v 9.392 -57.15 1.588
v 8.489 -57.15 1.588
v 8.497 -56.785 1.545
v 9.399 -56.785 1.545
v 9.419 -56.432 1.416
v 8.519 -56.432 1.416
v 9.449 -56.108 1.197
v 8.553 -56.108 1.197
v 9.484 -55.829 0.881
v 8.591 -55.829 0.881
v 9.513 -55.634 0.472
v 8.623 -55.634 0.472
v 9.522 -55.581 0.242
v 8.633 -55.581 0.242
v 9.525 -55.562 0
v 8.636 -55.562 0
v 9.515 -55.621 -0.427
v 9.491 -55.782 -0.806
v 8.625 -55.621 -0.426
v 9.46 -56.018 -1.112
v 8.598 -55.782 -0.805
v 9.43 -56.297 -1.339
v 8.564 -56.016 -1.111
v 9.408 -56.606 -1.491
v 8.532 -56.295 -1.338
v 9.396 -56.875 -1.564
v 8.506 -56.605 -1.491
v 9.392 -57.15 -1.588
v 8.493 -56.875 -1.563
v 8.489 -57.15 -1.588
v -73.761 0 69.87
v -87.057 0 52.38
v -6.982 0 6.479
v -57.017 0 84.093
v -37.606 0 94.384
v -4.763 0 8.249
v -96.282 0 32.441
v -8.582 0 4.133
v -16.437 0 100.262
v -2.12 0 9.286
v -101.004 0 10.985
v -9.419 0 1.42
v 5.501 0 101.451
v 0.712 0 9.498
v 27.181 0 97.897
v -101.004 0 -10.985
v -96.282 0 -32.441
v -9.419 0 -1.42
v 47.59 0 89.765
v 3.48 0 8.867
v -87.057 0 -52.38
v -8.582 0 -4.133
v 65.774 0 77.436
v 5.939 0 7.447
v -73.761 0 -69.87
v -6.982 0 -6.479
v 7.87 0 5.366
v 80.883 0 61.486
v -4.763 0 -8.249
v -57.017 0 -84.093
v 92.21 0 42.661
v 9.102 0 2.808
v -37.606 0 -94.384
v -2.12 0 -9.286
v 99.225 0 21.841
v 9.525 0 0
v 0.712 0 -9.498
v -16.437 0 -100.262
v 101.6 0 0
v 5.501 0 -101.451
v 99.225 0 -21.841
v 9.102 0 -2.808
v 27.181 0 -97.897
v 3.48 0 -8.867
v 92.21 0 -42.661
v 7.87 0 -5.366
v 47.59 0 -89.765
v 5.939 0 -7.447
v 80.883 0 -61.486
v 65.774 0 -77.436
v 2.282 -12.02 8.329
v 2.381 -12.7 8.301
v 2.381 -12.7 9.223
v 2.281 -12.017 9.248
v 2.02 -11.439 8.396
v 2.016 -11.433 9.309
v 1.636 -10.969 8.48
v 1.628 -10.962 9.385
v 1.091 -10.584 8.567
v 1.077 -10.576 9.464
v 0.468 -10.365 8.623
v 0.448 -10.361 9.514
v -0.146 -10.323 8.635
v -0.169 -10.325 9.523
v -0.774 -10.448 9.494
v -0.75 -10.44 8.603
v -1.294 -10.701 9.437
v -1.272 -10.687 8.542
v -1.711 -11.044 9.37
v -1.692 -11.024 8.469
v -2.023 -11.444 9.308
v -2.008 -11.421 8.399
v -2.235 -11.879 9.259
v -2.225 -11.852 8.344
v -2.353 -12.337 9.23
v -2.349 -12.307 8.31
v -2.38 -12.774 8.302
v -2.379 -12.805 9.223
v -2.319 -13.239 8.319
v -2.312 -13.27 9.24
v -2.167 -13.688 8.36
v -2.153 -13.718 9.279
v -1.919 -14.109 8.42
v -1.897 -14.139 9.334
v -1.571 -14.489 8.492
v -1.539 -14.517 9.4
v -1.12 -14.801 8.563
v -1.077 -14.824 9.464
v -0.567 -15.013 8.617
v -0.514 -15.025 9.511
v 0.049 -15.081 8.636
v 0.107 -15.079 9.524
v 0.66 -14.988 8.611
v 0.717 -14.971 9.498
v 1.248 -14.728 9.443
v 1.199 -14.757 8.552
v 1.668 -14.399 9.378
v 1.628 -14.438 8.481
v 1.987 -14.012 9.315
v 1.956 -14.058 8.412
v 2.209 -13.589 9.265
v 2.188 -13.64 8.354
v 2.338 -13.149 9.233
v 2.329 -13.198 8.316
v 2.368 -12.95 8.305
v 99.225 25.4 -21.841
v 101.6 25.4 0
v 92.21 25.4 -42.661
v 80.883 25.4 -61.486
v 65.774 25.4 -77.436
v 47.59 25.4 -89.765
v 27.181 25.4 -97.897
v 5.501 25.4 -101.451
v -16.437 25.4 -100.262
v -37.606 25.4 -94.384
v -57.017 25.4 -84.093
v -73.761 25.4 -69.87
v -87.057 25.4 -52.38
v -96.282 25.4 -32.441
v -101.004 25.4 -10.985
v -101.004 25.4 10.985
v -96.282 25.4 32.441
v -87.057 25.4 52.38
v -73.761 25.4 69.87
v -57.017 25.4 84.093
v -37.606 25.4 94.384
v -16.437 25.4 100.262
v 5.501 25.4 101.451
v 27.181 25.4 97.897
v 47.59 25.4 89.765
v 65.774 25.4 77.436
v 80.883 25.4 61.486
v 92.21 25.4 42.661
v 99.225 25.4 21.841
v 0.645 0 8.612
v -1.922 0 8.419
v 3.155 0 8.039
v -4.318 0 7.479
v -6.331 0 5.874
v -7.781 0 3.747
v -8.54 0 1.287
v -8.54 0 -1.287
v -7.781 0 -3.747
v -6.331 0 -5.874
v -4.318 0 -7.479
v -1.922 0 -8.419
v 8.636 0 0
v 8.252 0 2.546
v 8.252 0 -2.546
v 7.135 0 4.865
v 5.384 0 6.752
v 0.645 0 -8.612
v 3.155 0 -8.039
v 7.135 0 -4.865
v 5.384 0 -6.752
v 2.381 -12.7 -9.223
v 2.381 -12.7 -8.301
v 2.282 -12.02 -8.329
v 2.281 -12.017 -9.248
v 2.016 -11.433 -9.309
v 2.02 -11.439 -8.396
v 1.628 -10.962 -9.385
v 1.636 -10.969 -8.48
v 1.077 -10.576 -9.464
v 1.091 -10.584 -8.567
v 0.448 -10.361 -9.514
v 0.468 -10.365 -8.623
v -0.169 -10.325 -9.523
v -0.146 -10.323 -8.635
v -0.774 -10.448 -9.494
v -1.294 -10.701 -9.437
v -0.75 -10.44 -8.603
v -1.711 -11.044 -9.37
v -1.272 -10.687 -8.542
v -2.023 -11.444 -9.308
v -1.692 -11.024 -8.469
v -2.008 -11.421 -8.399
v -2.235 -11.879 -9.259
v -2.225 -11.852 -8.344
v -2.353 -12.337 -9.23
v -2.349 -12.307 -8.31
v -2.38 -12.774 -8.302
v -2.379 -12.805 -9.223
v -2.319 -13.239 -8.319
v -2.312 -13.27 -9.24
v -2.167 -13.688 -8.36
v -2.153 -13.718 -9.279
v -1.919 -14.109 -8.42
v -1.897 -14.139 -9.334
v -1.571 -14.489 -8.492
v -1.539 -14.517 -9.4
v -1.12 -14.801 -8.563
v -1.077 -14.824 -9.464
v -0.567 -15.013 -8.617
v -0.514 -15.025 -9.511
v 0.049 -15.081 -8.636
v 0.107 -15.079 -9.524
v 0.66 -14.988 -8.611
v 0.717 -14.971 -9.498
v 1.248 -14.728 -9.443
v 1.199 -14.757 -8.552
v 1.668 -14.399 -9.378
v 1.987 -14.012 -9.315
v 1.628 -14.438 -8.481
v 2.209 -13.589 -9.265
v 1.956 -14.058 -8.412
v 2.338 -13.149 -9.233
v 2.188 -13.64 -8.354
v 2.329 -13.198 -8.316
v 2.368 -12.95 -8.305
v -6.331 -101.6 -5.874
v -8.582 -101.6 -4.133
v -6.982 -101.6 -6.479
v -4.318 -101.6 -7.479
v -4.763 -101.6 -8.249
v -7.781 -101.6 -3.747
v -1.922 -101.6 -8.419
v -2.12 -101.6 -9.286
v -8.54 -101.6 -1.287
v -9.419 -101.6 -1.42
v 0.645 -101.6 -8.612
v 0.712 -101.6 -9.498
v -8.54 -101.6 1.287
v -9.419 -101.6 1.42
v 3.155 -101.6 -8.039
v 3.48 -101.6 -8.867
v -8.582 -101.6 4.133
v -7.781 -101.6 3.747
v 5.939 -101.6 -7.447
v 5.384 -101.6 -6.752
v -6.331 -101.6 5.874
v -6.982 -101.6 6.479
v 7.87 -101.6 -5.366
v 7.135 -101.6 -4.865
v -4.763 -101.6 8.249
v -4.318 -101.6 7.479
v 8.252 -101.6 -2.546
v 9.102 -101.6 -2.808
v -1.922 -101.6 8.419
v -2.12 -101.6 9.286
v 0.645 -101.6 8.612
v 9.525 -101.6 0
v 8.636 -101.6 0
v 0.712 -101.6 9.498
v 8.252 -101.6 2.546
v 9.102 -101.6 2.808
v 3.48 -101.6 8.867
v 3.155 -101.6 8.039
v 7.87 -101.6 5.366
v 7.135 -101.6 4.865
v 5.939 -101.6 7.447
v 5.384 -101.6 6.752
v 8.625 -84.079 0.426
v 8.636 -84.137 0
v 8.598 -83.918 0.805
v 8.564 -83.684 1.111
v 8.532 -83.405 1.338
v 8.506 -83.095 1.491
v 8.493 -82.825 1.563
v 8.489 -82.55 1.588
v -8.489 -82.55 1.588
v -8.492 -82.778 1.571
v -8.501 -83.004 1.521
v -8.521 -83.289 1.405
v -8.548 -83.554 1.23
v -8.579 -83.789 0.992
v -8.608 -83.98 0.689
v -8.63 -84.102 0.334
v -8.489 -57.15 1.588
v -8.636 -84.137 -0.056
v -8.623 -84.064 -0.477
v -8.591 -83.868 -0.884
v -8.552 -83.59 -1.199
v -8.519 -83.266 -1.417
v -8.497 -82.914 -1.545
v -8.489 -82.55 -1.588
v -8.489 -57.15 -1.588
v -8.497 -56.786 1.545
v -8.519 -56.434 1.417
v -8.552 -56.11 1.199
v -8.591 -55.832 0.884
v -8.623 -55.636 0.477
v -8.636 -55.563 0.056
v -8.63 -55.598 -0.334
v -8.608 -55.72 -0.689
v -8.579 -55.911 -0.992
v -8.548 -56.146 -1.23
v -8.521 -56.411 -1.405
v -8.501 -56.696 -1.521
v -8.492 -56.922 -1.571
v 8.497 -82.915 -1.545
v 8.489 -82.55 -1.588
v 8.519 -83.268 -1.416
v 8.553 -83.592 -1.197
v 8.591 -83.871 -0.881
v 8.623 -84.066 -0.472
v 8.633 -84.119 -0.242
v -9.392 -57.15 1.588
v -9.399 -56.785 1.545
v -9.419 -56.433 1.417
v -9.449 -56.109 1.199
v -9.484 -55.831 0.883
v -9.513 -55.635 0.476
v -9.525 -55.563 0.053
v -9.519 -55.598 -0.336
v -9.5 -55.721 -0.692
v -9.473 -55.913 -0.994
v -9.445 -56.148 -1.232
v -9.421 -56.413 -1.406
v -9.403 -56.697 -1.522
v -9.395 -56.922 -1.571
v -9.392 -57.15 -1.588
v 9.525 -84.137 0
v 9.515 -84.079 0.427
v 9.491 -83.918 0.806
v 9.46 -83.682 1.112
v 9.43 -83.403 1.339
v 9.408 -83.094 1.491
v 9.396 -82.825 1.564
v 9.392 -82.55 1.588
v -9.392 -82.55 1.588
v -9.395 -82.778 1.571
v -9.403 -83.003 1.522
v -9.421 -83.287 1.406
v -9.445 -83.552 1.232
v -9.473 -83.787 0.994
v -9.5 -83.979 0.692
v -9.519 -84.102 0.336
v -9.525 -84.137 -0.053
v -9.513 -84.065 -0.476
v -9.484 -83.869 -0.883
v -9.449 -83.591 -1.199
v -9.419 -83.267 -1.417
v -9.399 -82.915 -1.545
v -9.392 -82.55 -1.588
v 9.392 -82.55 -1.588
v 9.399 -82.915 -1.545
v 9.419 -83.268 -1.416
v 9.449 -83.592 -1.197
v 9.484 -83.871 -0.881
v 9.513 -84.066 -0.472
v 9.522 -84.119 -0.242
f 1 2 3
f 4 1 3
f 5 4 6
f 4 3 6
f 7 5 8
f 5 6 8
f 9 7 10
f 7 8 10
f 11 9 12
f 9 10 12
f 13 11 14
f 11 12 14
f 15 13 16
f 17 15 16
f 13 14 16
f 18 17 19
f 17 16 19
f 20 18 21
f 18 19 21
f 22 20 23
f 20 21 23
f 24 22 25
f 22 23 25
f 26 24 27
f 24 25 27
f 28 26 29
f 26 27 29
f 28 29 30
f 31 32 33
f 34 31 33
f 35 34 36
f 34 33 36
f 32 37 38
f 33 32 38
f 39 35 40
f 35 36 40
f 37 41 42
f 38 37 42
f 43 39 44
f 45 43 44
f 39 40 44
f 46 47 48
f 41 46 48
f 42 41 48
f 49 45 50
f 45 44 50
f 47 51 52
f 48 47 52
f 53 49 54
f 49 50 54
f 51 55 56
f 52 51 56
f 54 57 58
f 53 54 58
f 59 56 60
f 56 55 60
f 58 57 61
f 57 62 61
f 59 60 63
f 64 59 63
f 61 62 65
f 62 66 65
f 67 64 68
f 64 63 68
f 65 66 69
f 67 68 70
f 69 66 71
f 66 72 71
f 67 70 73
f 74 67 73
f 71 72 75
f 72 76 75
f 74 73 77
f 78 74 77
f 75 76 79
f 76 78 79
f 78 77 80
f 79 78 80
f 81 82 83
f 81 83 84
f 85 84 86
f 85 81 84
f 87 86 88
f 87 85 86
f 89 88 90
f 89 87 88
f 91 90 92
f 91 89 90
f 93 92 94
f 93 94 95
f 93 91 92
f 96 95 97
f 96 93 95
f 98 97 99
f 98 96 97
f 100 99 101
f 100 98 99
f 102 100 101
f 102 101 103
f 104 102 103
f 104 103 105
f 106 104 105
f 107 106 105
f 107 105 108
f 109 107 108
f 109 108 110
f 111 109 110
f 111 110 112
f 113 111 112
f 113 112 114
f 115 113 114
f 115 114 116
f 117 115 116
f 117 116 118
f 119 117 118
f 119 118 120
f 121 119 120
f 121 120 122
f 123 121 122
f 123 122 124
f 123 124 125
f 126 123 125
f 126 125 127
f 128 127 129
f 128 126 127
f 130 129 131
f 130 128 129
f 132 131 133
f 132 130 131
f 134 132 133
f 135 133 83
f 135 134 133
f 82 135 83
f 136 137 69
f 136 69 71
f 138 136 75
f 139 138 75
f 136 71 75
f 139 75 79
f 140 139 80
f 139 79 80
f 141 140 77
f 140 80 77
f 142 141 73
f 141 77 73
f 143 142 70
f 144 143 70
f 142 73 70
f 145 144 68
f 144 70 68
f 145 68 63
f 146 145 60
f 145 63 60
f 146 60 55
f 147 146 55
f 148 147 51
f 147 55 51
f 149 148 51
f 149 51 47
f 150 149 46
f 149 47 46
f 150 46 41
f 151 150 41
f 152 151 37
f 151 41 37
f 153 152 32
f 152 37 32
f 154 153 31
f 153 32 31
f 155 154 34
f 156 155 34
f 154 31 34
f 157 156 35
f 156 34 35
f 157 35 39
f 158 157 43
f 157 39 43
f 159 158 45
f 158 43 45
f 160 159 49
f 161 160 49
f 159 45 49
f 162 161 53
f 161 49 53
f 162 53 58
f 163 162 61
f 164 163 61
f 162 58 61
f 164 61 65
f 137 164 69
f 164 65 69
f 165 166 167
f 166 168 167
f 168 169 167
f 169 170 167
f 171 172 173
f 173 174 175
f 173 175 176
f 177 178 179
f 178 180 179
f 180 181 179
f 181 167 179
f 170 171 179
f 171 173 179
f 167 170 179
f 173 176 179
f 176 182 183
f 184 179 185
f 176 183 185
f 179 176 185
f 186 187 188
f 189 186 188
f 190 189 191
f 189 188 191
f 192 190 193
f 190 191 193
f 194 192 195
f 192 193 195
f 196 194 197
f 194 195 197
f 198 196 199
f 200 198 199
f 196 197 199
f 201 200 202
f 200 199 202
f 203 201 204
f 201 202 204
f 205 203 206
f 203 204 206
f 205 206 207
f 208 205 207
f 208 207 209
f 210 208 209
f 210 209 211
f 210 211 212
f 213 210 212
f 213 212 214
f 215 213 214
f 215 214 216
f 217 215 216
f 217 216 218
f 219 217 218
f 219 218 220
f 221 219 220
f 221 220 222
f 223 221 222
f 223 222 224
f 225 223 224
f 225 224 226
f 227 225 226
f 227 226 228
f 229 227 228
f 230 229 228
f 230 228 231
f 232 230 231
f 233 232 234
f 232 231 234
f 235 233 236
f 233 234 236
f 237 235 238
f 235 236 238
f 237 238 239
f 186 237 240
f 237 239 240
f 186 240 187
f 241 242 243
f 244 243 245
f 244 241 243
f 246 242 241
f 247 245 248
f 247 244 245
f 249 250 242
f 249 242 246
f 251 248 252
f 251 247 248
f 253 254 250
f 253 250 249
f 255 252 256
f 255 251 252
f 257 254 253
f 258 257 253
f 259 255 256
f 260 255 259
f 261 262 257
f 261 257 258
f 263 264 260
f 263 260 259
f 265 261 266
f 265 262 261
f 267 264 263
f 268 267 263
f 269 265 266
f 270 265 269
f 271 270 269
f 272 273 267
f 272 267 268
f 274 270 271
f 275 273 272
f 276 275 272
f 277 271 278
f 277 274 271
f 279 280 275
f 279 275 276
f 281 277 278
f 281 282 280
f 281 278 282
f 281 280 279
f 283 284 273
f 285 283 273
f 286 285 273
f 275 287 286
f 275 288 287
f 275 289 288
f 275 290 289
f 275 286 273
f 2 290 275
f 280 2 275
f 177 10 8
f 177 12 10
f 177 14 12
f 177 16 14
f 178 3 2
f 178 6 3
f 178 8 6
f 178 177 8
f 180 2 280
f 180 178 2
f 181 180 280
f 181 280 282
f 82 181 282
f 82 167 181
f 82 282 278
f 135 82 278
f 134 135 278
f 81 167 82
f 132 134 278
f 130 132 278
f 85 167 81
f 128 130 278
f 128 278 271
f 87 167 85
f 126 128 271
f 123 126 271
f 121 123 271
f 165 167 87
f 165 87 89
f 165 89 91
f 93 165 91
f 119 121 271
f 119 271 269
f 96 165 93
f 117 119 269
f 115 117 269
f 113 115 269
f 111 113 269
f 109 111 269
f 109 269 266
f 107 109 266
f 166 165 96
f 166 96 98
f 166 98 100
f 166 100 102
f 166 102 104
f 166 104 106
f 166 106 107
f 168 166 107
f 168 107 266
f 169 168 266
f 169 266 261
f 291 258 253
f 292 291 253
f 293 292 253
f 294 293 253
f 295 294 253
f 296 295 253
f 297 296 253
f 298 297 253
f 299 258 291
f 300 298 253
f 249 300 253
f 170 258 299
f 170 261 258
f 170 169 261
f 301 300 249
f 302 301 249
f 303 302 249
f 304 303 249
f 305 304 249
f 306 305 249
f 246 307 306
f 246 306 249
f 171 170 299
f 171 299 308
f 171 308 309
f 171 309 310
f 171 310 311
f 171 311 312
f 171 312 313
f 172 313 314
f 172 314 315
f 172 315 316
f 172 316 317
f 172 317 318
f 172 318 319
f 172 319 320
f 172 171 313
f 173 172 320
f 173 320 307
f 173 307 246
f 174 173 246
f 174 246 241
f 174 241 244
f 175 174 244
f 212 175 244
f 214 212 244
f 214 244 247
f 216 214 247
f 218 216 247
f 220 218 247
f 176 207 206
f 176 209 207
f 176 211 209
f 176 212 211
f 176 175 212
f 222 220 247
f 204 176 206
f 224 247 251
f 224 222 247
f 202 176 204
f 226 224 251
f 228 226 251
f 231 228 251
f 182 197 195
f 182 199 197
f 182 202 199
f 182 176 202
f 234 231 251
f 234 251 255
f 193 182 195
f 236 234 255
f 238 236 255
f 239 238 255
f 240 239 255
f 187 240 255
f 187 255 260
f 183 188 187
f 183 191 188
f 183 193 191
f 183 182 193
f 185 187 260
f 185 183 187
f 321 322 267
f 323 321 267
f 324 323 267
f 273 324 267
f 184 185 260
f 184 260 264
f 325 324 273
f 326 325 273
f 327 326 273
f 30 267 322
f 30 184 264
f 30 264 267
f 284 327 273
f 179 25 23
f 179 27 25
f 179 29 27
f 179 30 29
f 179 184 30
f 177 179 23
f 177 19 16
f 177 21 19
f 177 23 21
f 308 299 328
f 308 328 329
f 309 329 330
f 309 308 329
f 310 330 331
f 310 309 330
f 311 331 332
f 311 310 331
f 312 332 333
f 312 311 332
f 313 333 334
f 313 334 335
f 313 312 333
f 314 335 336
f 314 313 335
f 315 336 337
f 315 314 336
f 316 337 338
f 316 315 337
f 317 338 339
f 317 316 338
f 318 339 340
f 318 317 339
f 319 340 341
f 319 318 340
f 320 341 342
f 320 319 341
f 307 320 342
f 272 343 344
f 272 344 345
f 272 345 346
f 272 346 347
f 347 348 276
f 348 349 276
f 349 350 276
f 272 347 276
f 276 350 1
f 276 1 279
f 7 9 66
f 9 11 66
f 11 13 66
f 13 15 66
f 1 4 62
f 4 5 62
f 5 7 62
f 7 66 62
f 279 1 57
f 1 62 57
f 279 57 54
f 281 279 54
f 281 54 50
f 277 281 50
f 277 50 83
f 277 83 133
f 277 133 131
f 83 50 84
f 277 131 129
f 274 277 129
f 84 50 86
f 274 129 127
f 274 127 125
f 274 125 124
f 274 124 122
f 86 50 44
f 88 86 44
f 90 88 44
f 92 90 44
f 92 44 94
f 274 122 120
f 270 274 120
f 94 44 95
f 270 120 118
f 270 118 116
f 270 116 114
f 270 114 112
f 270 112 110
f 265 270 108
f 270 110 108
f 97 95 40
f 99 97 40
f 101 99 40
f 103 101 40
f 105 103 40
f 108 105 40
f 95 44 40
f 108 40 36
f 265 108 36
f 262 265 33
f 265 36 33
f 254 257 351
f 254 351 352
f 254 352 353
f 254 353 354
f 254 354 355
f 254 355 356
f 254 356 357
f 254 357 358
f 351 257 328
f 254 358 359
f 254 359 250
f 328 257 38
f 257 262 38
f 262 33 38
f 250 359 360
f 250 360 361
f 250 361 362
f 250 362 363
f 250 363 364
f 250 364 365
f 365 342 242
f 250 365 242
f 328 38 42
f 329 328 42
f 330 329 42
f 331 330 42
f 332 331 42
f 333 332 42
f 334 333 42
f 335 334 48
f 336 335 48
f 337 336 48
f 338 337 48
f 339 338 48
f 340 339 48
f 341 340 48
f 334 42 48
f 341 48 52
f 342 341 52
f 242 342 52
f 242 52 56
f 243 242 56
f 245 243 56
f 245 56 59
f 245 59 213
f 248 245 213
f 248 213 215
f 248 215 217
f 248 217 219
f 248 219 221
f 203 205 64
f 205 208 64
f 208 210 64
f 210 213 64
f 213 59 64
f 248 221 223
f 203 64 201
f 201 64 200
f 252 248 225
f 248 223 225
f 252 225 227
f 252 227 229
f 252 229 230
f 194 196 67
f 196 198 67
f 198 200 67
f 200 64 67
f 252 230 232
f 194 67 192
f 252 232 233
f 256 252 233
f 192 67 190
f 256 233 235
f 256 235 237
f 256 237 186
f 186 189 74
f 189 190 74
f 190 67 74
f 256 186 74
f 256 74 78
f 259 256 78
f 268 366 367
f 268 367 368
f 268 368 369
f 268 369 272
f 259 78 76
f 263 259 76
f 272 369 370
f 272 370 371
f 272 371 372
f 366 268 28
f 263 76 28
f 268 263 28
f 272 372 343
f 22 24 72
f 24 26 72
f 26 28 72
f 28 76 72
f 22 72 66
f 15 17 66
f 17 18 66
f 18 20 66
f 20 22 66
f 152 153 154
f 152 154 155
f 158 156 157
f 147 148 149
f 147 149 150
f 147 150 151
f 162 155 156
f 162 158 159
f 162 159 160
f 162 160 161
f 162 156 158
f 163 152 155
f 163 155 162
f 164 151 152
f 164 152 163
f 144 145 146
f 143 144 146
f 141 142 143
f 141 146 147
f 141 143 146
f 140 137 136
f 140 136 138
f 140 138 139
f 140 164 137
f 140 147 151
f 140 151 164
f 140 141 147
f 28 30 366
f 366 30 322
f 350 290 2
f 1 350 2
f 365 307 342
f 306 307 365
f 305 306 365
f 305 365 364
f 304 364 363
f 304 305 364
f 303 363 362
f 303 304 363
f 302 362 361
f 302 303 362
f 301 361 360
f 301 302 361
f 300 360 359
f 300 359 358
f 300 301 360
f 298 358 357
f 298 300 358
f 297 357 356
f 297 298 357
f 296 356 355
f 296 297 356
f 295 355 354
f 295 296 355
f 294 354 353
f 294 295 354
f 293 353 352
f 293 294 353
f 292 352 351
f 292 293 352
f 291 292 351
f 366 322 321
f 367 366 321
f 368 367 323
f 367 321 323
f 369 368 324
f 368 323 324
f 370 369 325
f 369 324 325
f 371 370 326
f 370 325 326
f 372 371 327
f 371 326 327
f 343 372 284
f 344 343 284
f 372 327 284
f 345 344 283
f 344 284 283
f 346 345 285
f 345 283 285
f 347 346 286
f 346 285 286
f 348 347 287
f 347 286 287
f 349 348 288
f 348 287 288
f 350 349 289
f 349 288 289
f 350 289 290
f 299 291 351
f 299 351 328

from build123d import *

# Parameters (mm, degrees)
SKETCH1_R               = 101.6
BOSS_EXTRUDE1_DEPTH     = 25.4
SKETCH2_R               = 9.525
SKETCH2_R_2             = 8.636
BOSS_EXTRUDE2_DEPTH     = 101.6
SKETCH3_R               = 2.38125
CUT_EXTRUDE1_DEPTH      = 102.6
CUT_EXTRUDE1_DEPTH_BACK = 102.6
CUT_EXTRUDE2_DEPTH      = 25.908
CUT_EXTRUDE2_DEPTH_BACK = 25.4


with BuildPart() as part:
    # Sketch1 → Boss-Extrude1 (new body)
    with BuildSketch(Plane(origin=(0, 0, 0), x_dir=(1, 0, 0), z_dir=(0, 1, 0))):
        Circle(SKETCH1_R)
    extrude(amount=BOSS_EXTRUDE1_DEPTH)

    # Sketch2 → Boss-Extrude2 (add)
    with BuildSketch(Plane.XZ):
        Circle(SKETCH2_R)
        Circle(SKETCH2_R_2, mode=Mode.SUBTRACT)
    extrude(amount=BOSS_EXTRUDE2_DEPTH)

    # Sketch3 → Cut-Extrude1 (cut, two sides)
    with BuildSketch(Plane.XY) as cut_extrude1_sk:
        with Locations((0, -12.7)):
            Circle(SKETCH3_R)
    extrude(amount=CUT_EXTRUDE1_DEPTH, mode=Mode.SUBTRACT)
    extrude(cut_extrude1_sk.sketch, amount=-CUT_EXTRUDE1_DEPTH_BACK, mode=Mode.SUBTRACT)

    # Sketch4 → Cut-Extrude2 (cut, two sides)
    with BuildSketch(Plane(origin=(0, 0, 0), x_dir=(0, 0, -1), z_dir=(1, 0, 0))) as cut_extrude2_sk:
        with BuildLine():
            Line((-1.5875, -82.55), (-1.5875, -57.15))
            ThreePointArc((-1.5875, -57.15), (0, -55.5625), (1.5875, -57.15))
            Line((1.5875, -57.15), (1.5875, -82.55))
            ThreePointArc((1.5875, -82.55), (0, -84.1375), (-1.5875, -82.55))
        make_face()
    extrude(amount=CUT_EXTRUDE2_DEPTH, mode=Mode.SUBTRACT)
    extrude(cut_extrude2_sk.sketch, amount=-CUT_EXTRUDE2_DEPTH_BACK, mode=Mode.SUBTRACT)


solid = part.part
